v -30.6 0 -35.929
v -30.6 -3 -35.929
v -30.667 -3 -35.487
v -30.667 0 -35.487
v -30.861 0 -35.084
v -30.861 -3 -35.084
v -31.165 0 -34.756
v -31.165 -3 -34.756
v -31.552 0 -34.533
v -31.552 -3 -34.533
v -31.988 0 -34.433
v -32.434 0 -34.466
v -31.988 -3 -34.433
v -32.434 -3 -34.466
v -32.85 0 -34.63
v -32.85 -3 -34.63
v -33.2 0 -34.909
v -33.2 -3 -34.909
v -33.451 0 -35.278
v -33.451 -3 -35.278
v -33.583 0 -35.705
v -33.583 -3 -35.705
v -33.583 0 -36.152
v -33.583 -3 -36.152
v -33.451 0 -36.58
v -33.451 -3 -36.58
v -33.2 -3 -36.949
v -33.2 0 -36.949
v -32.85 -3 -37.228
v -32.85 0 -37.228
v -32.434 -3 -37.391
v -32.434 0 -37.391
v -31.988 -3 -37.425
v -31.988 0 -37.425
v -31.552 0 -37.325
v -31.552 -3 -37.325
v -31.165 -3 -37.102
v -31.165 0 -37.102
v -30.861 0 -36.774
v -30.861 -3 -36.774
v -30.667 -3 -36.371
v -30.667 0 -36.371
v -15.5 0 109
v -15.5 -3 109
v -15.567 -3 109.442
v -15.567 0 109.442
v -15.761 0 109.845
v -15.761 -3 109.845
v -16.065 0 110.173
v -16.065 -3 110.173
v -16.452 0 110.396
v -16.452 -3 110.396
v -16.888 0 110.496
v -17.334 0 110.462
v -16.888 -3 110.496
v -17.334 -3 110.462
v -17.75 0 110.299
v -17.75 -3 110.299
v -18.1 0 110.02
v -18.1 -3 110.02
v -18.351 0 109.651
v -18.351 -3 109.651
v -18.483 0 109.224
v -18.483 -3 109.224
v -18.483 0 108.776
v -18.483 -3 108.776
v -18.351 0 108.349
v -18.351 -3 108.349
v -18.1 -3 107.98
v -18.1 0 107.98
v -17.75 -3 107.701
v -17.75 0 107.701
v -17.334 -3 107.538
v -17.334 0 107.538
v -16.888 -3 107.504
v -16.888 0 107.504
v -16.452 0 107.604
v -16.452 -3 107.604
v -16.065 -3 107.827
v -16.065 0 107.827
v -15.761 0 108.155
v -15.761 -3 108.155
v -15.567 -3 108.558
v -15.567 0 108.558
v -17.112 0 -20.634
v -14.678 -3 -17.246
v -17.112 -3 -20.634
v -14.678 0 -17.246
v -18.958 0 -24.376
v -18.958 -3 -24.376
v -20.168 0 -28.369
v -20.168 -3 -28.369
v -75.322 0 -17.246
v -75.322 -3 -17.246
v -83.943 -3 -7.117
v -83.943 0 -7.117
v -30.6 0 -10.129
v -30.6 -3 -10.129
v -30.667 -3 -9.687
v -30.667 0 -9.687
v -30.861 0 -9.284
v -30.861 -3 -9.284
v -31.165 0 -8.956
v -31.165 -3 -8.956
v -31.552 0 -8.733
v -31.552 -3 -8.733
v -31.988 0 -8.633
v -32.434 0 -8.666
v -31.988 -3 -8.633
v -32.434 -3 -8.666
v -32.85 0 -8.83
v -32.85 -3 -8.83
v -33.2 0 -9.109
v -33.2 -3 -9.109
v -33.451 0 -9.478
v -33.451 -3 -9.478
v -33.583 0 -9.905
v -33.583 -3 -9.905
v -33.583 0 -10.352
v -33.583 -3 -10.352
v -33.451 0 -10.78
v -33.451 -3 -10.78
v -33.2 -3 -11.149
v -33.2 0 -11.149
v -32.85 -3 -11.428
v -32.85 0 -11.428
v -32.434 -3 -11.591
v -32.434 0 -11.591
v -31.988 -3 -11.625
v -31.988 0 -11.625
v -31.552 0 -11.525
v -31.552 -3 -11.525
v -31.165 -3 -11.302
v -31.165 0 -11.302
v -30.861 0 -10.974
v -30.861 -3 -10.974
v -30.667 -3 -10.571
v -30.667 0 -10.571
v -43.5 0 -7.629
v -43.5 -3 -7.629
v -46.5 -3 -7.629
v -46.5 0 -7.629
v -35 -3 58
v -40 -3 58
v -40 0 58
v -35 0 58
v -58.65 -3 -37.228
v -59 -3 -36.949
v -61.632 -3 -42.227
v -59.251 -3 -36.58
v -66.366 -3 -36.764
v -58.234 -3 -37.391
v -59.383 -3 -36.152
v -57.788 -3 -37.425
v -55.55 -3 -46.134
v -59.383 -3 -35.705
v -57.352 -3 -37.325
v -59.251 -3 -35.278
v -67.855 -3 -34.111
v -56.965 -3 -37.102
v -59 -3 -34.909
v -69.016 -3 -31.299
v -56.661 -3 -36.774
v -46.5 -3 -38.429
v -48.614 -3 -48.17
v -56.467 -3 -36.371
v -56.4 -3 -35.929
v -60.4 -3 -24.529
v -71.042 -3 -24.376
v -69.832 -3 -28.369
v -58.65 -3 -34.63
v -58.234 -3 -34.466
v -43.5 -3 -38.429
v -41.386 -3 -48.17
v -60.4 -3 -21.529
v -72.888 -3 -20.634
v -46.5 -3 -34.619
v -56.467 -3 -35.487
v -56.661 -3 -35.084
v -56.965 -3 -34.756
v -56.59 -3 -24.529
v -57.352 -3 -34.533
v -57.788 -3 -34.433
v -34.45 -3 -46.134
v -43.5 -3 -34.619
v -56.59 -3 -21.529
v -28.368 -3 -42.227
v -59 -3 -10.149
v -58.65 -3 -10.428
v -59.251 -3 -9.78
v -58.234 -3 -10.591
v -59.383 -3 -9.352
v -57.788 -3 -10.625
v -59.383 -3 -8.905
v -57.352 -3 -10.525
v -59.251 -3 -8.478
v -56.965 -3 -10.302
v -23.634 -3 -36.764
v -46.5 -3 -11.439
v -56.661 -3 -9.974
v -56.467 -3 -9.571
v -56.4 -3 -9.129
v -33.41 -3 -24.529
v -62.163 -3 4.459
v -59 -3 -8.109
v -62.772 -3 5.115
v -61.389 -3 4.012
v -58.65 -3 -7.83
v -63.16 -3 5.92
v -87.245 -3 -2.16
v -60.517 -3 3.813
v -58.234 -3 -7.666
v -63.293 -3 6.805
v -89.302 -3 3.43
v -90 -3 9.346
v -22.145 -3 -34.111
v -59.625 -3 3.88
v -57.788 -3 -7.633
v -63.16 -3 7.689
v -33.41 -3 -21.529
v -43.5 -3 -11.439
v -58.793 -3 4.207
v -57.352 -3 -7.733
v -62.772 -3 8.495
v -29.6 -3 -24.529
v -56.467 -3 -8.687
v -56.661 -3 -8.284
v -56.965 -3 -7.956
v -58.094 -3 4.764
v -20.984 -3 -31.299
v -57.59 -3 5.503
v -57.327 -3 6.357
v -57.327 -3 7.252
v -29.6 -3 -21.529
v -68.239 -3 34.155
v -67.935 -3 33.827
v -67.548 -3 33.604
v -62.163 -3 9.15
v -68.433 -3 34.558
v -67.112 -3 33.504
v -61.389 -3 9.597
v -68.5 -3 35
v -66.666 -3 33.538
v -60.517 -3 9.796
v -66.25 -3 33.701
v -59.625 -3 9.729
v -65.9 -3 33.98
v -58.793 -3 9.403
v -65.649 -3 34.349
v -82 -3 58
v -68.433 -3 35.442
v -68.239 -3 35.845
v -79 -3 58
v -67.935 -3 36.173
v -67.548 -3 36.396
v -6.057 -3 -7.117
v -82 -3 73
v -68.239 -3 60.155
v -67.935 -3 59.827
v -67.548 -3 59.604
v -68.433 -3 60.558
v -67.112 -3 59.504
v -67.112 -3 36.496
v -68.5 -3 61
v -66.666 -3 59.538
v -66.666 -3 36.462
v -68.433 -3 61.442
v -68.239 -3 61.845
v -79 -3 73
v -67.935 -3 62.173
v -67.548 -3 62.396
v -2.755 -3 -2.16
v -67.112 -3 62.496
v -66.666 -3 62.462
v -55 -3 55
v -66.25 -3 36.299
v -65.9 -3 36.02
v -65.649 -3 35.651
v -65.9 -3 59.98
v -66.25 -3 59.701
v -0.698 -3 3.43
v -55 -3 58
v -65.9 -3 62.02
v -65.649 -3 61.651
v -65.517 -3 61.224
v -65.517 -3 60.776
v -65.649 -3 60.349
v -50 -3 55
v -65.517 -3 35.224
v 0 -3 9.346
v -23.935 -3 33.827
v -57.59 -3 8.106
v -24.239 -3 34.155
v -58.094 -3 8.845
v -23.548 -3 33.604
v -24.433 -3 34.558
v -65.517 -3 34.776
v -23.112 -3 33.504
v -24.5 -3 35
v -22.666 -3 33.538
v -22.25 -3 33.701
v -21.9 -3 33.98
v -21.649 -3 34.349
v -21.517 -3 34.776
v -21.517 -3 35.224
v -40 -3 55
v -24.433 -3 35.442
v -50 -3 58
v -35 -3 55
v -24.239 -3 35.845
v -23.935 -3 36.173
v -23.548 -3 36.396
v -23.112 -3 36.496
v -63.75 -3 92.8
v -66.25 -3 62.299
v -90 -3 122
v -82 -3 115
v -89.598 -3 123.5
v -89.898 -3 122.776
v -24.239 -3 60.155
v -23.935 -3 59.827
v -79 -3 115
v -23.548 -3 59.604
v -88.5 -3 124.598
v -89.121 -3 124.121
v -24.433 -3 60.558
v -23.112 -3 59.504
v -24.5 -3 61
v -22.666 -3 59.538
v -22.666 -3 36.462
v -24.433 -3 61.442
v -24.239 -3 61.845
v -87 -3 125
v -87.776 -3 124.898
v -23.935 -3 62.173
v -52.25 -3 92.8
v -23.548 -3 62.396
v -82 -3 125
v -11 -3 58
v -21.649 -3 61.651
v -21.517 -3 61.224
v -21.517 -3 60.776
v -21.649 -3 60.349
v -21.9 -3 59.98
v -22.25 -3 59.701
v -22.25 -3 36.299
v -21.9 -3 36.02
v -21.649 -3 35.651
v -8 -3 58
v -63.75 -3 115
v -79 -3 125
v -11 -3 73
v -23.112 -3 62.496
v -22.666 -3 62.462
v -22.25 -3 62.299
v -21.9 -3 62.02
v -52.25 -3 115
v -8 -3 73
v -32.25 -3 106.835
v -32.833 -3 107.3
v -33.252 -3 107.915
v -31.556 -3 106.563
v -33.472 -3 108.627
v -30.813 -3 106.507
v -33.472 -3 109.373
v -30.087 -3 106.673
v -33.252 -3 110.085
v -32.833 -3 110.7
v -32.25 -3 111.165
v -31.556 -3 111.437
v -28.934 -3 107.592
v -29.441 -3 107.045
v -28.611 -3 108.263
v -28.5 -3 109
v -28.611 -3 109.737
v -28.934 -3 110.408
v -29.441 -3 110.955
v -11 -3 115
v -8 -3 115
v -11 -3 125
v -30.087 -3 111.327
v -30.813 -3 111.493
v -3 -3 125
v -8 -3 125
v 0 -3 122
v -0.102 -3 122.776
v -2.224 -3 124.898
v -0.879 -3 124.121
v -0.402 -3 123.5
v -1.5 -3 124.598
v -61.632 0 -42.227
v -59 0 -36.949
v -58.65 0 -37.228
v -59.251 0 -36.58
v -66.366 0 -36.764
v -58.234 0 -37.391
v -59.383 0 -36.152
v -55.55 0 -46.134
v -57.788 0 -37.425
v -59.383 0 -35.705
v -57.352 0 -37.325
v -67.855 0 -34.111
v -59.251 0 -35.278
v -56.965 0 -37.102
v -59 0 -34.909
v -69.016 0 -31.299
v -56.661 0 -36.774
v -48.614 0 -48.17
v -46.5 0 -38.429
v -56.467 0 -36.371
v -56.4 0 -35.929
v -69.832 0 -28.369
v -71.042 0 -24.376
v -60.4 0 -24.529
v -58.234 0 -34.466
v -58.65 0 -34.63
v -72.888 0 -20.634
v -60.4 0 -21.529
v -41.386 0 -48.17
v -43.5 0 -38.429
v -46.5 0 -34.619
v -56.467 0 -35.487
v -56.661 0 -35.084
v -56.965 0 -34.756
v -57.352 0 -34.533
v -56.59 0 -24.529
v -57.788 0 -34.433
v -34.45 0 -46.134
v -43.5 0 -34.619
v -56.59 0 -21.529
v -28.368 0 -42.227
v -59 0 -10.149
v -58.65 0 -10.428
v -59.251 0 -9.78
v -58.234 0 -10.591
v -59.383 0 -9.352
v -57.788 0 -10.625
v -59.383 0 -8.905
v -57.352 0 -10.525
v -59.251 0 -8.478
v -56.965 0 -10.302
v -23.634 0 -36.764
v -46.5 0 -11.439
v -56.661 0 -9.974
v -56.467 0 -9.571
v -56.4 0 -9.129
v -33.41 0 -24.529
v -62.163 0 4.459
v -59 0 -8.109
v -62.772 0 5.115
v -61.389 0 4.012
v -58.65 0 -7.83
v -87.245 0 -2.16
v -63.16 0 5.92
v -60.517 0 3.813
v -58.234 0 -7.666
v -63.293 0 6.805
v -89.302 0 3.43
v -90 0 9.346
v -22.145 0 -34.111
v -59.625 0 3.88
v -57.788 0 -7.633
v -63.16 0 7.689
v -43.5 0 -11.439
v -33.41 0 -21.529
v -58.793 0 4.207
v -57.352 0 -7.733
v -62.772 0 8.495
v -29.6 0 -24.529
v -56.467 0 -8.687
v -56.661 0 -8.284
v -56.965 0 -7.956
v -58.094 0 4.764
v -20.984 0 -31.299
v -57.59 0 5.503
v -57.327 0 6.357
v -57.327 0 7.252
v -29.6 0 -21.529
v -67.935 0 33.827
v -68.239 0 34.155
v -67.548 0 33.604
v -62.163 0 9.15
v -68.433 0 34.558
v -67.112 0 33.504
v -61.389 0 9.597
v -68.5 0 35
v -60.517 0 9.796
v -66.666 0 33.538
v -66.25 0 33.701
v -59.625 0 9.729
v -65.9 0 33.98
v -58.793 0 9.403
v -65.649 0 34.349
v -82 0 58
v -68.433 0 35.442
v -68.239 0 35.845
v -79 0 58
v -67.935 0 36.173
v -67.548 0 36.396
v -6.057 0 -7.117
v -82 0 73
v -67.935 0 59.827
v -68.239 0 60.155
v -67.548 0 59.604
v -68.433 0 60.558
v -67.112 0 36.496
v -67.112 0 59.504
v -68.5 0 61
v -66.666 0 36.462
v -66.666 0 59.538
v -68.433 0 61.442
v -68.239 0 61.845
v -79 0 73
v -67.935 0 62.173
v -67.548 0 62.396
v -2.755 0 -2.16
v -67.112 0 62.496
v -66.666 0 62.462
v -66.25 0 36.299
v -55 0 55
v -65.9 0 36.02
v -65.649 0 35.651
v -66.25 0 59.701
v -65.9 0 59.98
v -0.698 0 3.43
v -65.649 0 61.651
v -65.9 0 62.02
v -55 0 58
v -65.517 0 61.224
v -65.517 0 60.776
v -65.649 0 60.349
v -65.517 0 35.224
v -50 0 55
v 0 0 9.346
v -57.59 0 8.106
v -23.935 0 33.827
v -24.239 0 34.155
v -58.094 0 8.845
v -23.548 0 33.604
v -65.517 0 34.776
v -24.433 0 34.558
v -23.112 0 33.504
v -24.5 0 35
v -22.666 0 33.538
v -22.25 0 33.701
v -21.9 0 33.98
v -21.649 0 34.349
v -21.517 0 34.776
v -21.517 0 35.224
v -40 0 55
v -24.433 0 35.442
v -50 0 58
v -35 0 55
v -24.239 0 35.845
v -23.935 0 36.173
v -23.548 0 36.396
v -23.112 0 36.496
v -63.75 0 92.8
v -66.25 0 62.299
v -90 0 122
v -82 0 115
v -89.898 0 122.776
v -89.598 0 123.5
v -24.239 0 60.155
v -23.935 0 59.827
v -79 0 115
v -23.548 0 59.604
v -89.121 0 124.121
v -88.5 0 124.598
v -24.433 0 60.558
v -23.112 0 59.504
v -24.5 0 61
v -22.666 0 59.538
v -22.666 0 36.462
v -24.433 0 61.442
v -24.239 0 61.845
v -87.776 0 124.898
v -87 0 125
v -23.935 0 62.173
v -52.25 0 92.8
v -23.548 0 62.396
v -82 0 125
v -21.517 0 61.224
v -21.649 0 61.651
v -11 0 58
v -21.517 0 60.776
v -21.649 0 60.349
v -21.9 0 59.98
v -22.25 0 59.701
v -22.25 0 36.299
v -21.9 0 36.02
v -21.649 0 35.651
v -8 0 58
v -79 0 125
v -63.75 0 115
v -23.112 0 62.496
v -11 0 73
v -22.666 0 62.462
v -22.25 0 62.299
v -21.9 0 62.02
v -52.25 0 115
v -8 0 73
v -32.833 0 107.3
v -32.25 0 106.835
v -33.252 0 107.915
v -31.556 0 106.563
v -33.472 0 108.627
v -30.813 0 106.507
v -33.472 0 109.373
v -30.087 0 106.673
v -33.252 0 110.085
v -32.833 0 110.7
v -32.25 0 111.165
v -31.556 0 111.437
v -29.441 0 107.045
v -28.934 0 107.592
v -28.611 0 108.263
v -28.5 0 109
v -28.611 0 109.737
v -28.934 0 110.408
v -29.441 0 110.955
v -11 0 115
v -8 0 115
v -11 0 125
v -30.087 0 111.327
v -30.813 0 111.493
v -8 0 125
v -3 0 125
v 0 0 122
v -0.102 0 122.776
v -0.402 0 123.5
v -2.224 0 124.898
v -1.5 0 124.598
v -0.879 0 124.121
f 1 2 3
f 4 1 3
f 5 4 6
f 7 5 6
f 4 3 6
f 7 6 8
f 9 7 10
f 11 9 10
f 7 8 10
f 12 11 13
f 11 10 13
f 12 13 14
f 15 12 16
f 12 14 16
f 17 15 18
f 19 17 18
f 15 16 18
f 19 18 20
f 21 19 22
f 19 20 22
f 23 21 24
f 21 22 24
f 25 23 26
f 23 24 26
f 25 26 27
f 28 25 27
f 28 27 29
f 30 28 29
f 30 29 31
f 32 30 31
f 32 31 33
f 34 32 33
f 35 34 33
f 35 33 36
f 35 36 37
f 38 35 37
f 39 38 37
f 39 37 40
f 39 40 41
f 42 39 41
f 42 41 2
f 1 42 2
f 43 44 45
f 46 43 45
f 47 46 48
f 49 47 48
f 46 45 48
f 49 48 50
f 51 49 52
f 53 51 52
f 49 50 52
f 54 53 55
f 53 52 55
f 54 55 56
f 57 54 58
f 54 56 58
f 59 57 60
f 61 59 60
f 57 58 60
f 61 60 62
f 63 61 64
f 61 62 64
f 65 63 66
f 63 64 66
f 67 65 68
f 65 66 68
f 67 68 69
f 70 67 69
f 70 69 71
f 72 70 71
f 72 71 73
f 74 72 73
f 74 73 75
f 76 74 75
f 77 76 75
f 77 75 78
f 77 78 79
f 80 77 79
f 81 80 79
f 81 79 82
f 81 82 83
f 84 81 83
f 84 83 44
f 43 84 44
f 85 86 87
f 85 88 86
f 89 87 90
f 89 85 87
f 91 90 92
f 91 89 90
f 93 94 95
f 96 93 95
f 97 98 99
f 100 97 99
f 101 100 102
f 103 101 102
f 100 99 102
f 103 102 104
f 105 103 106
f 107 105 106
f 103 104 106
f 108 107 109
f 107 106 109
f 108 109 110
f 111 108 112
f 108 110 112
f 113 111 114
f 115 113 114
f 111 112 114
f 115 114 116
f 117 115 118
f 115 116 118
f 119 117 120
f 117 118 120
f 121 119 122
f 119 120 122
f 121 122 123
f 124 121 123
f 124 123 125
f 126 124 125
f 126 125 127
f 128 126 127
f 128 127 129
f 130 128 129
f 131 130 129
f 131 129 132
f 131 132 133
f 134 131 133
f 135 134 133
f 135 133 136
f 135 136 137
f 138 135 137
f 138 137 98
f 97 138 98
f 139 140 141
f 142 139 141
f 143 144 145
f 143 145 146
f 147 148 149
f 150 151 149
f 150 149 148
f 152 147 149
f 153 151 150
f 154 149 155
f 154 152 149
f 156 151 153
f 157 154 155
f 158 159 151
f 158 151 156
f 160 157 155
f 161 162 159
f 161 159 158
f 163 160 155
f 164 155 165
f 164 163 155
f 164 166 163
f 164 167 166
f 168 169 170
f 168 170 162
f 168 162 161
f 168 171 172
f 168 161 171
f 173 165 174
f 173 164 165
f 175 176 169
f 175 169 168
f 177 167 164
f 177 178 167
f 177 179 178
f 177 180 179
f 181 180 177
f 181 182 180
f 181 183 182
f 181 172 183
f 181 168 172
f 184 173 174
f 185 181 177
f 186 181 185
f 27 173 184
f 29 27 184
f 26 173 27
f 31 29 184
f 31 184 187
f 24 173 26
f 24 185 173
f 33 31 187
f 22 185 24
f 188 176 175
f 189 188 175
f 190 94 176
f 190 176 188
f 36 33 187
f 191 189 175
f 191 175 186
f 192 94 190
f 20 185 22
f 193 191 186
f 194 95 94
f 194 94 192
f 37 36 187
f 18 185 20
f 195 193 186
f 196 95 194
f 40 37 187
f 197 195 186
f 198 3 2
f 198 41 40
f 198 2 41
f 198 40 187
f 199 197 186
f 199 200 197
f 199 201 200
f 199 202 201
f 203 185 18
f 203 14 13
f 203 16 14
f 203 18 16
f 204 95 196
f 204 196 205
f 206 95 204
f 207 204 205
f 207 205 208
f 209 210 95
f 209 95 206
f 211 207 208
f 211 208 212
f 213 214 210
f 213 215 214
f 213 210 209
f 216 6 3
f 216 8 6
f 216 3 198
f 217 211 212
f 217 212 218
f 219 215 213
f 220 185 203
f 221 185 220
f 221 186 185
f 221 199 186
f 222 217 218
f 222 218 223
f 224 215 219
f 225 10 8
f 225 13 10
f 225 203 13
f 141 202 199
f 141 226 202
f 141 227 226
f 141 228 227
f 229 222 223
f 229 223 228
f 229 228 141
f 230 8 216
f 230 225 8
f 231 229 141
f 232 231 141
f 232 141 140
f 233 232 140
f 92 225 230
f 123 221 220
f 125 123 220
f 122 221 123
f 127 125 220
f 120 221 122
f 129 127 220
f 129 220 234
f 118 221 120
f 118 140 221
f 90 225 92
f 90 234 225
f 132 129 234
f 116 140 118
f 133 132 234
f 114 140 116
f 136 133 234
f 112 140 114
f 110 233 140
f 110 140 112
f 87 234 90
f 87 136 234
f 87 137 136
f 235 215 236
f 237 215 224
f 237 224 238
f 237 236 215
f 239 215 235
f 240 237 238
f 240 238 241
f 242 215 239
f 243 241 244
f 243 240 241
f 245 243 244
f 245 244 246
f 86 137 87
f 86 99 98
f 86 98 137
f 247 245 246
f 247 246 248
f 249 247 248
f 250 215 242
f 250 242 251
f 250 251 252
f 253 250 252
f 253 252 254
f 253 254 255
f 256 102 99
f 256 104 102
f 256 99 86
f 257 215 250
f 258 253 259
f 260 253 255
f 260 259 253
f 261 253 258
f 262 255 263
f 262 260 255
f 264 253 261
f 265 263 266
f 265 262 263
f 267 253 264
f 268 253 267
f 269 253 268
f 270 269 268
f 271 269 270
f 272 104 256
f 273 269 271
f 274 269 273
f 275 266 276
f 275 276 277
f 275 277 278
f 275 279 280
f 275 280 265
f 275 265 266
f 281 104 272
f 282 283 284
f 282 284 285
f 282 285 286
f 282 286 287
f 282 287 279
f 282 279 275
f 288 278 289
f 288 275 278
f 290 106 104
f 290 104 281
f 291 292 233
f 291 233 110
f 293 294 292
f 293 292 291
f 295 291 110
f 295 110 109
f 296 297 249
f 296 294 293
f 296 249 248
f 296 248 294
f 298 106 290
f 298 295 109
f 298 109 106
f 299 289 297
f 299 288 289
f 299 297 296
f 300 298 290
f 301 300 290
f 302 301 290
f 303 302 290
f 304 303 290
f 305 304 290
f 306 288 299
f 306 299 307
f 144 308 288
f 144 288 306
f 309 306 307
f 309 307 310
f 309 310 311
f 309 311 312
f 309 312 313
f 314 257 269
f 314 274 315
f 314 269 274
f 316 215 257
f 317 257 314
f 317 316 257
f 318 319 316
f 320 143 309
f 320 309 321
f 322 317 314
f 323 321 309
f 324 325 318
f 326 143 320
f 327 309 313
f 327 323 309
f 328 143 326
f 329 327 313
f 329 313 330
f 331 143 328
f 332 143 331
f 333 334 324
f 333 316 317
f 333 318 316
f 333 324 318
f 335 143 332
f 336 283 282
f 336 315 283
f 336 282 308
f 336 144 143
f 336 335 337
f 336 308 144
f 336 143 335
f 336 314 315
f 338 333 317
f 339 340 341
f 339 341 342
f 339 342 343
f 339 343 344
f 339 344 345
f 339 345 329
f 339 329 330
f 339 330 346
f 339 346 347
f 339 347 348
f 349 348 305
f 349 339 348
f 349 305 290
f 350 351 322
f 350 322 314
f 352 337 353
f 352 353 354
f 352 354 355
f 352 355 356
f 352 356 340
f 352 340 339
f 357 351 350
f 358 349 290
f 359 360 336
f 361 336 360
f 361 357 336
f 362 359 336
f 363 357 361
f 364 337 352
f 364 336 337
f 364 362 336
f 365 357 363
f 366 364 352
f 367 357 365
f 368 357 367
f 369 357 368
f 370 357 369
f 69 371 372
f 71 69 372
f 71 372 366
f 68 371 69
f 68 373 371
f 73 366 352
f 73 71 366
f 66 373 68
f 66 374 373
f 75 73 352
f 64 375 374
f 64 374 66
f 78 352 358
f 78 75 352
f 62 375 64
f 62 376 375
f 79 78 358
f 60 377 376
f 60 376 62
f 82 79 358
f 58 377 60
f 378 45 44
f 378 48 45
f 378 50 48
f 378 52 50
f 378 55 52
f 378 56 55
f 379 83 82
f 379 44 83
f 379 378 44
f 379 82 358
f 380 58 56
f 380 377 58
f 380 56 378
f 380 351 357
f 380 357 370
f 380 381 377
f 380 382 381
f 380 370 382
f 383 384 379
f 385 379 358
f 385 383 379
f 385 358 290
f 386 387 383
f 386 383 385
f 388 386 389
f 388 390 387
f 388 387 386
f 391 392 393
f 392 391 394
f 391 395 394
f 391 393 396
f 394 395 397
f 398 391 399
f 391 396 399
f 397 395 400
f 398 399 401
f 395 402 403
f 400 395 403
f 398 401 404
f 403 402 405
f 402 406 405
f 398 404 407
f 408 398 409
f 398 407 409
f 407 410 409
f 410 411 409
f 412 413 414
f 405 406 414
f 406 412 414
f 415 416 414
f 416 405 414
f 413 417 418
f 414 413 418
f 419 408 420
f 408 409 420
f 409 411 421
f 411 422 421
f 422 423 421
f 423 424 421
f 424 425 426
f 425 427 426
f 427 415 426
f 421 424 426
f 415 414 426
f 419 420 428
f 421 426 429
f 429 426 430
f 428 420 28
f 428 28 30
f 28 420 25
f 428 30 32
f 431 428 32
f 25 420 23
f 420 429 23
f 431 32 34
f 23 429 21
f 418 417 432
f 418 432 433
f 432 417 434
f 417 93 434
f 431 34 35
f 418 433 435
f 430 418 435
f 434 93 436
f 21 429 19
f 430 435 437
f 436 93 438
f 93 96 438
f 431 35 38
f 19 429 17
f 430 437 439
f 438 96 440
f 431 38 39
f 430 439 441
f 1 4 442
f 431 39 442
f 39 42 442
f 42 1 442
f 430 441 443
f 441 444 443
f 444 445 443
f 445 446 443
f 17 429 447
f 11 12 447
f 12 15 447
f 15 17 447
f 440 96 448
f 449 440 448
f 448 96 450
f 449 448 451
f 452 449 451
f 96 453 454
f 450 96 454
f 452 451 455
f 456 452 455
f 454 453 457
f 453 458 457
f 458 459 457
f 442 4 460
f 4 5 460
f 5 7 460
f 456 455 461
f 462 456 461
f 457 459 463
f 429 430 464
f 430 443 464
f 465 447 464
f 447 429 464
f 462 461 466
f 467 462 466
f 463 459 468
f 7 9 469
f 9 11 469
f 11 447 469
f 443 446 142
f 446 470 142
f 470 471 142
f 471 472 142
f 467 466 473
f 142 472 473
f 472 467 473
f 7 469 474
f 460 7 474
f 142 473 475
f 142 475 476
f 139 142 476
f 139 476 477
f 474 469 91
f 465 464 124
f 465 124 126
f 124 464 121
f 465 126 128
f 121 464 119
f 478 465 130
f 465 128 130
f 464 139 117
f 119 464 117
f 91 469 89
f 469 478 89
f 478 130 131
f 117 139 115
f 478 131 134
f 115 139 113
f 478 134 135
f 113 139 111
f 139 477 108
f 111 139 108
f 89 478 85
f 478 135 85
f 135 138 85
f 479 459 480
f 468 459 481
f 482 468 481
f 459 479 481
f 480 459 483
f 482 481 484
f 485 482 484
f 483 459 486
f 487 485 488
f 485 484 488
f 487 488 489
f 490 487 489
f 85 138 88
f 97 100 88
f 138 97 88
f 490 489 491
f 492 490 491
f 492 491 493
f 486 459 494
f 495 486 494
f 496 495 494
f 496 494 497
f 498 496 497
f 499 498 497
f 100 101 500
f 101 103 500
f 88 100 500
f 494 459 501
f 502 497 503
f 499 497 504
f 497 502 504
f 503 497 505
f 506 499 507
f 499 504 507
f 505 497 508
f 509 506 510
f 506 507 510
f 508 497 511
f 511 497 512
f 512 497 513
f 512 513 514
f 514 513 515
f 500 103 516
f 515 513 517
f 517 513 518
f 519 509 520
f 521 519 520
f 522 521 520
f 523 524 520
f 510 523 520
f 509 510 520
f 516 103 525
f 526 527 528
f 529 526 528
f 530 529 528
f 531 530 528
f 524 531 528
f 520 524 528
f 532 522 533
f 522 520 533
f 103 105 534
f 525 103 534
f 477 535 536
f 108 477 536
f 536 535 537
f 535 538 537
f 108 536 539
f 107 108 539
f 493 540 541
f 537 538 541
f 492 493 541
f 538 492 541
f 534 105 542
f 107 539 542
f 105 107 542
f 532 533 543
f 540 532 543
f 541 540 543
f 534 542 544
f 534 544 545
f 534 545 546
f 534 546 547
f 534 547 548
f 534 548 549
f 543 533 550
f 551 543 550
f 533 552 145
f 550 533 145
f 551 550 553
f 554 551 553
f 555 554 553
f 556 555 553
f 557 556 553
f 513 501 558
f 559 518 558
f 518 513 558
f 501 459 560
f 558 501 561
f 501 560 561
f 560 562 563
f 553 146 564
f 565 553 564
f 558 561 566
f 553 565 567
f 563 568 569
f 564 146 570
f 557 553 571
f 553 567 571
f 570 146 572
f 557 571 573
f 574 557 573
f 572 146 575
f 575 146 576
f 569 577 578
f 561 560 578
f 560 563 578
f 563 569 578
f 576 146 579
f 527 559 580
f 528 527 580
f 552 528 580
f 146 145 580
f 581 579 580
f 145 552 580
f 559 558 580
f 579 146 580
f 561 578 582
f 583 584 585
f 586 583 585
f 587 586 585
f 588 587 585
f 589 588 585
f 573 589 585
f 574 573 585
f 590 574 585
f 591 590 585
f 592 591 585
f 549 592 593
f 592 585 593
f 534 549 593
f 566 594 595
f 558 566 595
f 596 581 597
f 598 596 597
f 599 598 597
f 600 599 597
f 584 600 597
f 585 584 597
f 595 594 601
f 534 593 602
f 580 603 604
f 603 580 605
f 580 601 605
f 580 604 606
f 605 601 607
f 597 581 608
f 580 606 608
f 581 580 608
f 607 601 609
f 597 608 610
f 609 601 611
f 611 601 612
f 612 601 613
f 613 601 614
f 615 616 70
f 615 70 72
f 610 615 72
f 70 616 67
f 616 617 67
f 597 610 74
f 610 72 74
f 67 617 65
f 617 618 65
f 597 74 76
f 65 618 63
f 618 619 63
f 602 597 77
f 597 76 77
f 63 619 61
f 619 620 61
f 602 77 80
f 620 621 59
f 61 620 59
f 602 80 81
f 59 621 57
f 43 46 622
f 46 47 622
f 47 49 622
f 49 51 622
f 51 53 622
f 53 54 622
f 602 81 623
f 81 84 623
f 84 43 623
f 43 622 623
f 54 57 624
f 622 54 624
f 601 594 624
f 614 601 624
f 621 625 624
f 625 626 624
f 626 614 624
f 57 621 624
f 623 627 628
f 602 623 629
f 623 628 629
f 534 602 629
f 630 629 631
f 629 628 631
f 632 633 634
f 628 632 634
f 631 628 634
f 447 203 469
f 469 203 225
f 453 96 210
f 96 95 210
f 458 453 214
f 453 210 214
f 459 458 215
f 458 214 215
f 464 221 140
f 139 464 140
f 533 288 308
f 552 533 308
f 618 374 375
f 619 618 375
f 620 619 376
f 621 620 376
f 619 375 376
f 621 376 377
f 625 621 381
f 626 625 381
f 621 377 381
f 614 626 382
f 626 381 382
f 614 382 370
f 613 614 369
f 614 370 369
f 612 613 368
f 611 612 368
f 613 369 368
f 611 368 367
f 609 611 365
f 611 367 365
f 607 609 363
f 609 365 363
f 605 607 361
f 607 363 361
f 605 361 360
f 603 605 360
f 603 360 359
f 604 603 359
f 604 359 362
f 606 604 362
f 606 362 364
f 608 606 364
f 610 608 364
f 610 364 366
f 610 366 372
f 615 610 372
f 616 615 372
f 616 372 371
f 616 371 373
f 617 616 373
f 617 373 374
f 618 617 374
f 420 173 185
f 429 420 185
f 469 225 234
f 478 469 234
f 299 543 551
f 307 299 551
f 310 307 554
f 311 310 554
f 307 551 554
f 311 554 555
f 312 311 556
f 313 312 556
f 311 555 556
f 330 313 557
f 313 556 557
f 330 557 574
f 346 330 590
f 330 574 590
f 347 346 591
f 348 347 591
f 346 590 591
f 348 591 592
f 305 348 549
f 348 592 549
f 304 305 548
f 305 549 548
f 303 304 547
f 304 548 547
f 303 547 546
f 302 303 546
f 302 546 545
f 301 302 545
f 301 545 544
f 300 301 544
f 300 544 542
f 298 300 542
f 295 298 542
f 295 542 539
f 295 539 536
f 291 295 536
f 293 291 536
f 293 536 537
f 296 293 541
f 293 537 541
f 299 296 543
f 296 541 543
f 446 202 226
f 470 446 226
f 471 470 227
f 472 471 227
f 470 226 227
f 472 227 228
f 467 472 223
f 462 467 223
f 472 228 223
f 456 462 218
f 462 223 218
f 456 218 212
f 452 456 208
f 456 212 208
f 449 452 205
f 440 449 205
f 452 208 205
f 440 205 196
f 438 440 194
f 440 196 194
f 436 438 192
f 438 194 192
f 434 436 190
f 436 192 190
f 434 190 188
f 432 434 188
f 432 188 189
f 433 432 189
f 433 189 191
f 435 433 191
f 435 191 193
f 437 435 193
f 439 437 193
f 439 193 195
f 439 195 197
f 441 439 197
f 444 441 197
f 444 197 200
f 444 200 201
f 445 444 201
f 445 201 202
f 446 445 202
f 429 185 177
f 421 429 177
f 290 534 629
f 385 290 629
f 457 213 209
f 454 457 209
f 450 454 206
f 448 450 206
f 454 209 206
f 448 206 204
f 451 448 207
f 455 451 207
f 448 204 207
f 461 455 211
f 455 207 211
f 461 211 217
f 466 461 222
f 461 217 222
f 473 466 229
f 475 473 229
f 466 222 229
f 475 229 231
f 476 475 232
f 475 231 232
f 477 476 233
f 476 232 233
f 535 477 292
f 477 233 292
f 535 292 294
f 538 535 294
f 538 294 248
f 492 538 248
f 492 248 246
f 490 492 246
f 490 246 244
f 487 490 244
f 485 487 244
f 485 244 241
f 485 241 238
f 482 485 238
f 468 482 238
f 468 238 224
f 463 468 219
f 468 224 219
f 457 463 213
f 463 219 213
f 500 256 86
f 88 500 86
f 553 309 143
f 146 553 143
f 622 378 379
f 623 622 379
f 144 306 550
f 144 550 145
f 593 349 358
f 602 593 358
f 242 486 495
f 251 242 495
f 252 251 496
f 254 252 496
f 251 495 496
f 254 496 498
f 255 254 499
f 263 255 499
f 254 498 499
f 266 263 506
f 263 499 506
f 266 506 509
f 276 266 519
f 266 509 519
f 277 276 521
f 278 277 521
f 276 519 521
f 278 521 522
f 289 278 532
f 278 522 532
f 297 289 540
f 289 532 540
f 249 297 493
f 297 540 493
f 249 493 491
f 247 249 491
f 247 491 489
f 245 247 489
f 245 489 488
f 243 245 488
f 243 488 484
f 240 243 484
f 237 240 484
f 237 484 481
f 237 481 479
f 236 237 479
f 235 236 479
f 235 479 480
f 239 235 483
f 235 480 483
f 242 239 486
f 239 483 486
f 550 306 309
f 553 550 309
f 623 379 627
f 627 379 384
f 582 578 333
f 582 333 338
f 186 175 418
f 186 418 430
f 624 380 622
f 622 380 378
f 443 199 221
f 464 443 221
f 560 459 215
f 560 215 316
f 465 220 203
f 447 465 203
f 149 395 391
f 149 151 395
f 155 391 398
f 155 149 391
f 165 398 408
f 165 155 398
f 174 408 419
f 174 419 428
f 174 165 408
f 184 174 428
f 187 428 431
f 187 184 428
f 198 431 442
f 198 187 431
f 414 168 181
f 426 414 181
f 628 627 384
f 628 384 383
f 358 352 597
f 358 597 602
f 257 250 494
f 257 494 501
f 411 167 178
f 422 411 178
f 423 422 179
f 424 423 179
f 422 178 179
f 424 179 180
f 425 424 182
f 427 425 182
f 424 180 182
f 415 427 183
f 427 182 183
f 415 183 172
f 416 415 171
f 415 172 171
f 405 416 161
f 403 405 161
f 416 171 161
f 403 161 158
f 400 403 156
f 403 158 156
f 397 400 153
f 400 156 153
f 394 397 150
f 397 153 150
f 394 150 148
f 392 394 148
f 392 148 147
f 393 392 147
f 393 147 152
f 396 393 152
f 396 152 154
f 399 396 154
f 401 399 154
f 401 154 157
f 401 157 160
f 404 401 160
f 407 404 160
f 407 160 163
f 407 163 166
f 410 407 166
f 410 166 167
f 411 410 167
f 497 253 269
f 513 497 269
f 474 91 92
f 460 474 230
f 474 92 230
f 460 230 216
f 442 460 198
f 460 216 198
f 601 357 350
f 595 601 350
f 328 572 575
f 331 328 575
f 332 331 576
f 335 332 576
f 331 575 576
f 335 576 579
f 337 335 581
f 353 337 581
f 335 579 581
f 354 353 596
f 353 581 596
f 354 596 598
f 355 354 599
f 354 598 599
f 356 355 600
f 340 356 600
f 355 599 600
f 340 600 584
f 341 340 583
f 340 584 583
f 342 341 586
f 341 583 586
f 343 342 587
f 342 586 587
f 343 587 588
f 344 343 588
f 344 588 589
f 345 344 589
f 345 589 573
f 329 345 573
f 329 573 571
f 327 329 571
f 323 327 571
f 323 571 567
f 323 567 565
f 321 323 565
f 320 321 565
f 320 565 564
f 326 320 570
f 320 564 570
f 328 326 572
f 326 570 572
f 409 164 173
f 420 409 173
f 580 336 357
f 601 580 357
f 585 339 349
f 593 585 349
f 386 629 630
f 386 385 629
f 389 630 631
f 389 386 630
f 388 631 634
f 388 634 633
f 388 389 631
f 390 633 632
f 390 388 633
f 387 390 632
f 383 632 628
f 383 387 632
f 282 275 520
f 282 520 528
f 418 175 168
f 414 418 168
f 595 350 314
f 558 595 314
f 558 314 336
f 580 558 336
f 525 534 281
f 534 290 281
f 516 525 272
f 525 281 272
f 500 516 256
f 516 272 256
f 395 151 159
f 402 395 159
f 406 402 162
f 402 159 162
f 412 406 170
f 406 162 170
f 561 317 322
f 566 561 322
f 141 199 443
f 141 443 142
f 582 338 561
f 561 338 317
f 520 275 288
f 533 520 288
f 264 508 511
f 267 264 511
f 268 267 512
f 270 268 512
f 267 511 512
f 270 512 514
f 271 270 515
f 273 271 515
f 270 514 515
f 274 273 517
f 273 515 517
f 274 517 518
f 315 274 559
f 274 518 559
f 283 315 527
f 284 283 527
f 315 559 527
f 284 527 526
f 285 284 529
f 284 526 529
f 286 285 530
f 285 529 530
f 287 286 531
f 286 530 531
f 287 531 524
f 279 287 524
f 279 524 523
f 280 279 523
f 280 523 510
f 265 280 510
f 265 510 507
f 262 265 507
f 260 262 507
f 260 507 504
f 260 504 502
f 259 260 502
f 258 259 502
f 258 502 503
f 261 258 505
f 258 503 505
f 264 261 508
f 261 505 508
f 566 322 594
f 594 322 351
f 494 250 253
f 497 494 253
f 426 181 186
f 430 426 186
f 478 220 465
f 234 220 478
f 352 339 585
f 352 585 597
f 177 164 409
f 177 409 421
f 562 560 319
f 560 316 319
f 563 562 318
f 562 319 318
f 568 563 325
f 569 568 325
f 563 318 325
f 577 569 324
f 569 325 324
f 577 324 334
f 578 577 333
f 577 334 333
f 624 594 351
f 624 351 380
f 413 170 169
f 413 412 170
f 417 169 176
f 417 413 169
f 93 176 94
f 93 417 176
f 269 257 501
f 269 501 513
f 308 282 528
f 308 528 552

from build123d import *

# Parameters (mm, degrees)
F0_W      = 90
F0_H      = 125
F1_DEPTH  = 3
F3_R      = 2.5
F3_R_2    = 1.5
F4_DEPTH  = 25.4
F5_R      = 25.4
F2_W      = 3
F2_H      = 5
F2_H_2    = 15
F2_H_3    = 10
F2_W_2    = 5
F2_H_4    = 3
F6_DEPTH  = 25.4
F7_W      = 3.81
F7_H      = 1.5
F7_W_2    = 1.5
F7_H_2    = 3.81
F7_R      = 1.5
F8_DEPTH  = 25.4
F9_R      = 3
F11_DEPTH = 25.4
F12_R     = 25.4
F13_R     = 1.5
F14_DEPTH = 3
F16_DEPTH = 3


# Not quite as in the source:
# - a feature names something its author has since deleted; it is built from what else it names


with BuildPart() as f1:
    # F0 (on Front) → F1 (new body)
    with BuildSketch(Plane.XZ):
        with Locations((-45, 62.5)):
            Rectangle(F0_W, F0_H)
        Polygon((-45, -70), (0, 0), (-90, 0), align=None)
    extrude(amount=F1_DEPTH)

    # F3 (on face) → F4 (cut)
    with BuildSketch(Plane.XZ.offset(3)):
        Polygon((-59, 115), (-63.75, 115), (-63.75, 109), (-58, 109), (-58, 115), align=None)
        Polygon((-58, 109), (-63.75, 109), (-63.75, 92.8), (-59, 92.8), (-58, 92.8), align=None)
        Polygon((-57, 115), (-58, 115), (-58, 109), (-52.25, 109), (-52.25, 115), align=None)
        Polygon((-52.25, 109), (-58, 109), (-58, 92.8), (-57, 92.8), (-52.25, 92.8), align=None)
        with Locations((-31, 109)):
            Circle(F3_R)
        with Locations((-17, 109)):
            Circle(F3_R_2)
    extrude(amount=-F4_DEPTH, mode=Mode.SUBTRACT)

    # F5
    f5_edges = [f1.edges().sort_by_distance(p)[0] for p in [
        (-45, -1.5, -70),
    ]]
    fillet(f5_edges, radius=F5_R)

    # F2 (on face) → F6 (cut)
    with BuildSketch(Plane.XZ.offset(3)):
        with Locations((-80.5, 127.5)):
            Rectangle(F2_W, F2_H)
        with Locations((-9.5, 127.5)):
            Rectangle(F2_W, F2_H)
        with Locations((-9.5, 65.5)):
            Rectangle(F2_W, F2_H_2)
        with Locations((-80.5, 65.5)):
            Rectangle(F2_W, F2_H_2)
        with Locations((-80.5, 120)):
            Rectangle(F2_W, F2_H_3)
        with Locations((-9.5, 120)):
            Rectangle(F2_W, F2_H_3)
        with Locations((-52.5, 56.5)):
            Rectangle(F2_W_2, F2_H_4)
        with Locations((-37.5, 56.5)):
            Rectangle(F2_W_2, F2_H_4)
    extrude(amount=-F6_DEPTH, mode=Mode.SUBTRACT)

    # F7 (on face) → F8 (cut)
    with BuildSketch(Plane.XZ.offset(3)):
        with Locations((-58.495, -22.2788609758)):
            Rectangle(F7_W, F7_H)
        with Locations((-58.495, -23.7788609758)):
            Rectangle(F7_W, F7_H)
        with Locations((-31.505, -22.2788609758)):
            Rectangle(F7_W, F7_H)
        with Locations((-31.505, -23.7788609758)):
            Rectangle(F7_W, F7_H)
        with Locations((-44.25, -36.5238609758)):
            Rectangle(F7_W_2, F7_H_2)
        with Locations((-45.75, -36.5238609758)):
            Rectangle(F7_W_2, F7_H_2)
        with Locations((-44.25, -9.5338609758)):
            Rectangle(F7_W_2, F7_H_2)
        with Locations((-45.75, -9.5338609758)):
            Rectangle(F7_W_2, F7_H_2)
        with Locations((-57.9, -9.1288609758)):
            Circle(F7_R)
        with Locations((-32.1, -10.1288609758)):
            Circle(F7_R)
        with Locations((-32.1, -35.9288609758)):
            Circle(F7_R)
        with Locations((-57.9, -35.9288609758)):
            Circle(F7_R)
    extrude(amount=-F8_DEPTH, mode=Mode.SUBTRACT)

    # F9
    f9_edges = [f1.edges().sort_by_distance(p)[0] for p in [
        (0, -1.5, 125),
        (-90, -1.5, 125),
    ]]
    fillet(f9_edges, radius=F9_R)

    # F10 (on face) → F11 (cut)
    with BuildSketch(Plane.XZ.offset(3)):
        with BuildLine():
            ThreePointArc((-66.3659332746, -36.7641037951), (-69.3706247886, -30.1865594475), (-70.4, -23.0288609758))
            Line((-70.4, -23.0288609758), (-90, 0))
            Line((-90, 0), (-66.3659332746, -36.7641037951))
        make_face()
        with BuildLine():
            Line((0, 0), (-19.6, -23.0288609758))
            ThreePointArc((-19.6, -23.0288609758), (-20.6293752114, -30.1865594475), (-23.6340667254, -36.7641037951))
            Line((-23.6340667254, -36.7641037951), (0, 0))
        make_face()
    extrude(amount=-F11_DEPTH, mode=Mode.SUBTRACT)

    # F12
    f12_edges = [f1.edges().sort_by_distance(p)[0] for p in [
        (-70.4, -1.5, -23.028861),
        (-90, -1.5, 0),
        (-19.6, -1.5, -23.028861),
        (0, -1.5, 0),
    ]]
    fillet(f12_edges, radius=F12_R)

    # F13 (on face) → F14 (cut, through all)
    with BuildSketch(Plane(origin=(0, 0, 0), x_dir=(-1, 0, 0), z_dir=(0, 1, 0))):
        with Locations((23, 61)):
            Circle(F13_R)
        with Locations((23, 35)):
            Circle(F13_R)
        with Locations((67, 35)):
            Circle(F13_R)
        with Locations((67, 61)):
            Circle(F13_R)
    extrude(amount=-F14_DEPTH, mode=Mode.SUBTRACT)

    # F15 (on face) → F16 (cut)
    with BuildSketch(Plane.XZ.offset(3)):
        with BuildLine():
            ThreePointArc((-57.2929937846, 6.804616942), (-60.2929937846, 9.804616942), (-63.2929937846, 6.804616942))
            ThreePointArc((-63.2929937846, 6.804616942), (-60.2929937846, 3.804616942), (-57.2929937846, 6.804616942))
        make_face()
    extrude(amount=-F16_DEPTH, mode=Mode.SUBTRACT)


solid = f1.part
